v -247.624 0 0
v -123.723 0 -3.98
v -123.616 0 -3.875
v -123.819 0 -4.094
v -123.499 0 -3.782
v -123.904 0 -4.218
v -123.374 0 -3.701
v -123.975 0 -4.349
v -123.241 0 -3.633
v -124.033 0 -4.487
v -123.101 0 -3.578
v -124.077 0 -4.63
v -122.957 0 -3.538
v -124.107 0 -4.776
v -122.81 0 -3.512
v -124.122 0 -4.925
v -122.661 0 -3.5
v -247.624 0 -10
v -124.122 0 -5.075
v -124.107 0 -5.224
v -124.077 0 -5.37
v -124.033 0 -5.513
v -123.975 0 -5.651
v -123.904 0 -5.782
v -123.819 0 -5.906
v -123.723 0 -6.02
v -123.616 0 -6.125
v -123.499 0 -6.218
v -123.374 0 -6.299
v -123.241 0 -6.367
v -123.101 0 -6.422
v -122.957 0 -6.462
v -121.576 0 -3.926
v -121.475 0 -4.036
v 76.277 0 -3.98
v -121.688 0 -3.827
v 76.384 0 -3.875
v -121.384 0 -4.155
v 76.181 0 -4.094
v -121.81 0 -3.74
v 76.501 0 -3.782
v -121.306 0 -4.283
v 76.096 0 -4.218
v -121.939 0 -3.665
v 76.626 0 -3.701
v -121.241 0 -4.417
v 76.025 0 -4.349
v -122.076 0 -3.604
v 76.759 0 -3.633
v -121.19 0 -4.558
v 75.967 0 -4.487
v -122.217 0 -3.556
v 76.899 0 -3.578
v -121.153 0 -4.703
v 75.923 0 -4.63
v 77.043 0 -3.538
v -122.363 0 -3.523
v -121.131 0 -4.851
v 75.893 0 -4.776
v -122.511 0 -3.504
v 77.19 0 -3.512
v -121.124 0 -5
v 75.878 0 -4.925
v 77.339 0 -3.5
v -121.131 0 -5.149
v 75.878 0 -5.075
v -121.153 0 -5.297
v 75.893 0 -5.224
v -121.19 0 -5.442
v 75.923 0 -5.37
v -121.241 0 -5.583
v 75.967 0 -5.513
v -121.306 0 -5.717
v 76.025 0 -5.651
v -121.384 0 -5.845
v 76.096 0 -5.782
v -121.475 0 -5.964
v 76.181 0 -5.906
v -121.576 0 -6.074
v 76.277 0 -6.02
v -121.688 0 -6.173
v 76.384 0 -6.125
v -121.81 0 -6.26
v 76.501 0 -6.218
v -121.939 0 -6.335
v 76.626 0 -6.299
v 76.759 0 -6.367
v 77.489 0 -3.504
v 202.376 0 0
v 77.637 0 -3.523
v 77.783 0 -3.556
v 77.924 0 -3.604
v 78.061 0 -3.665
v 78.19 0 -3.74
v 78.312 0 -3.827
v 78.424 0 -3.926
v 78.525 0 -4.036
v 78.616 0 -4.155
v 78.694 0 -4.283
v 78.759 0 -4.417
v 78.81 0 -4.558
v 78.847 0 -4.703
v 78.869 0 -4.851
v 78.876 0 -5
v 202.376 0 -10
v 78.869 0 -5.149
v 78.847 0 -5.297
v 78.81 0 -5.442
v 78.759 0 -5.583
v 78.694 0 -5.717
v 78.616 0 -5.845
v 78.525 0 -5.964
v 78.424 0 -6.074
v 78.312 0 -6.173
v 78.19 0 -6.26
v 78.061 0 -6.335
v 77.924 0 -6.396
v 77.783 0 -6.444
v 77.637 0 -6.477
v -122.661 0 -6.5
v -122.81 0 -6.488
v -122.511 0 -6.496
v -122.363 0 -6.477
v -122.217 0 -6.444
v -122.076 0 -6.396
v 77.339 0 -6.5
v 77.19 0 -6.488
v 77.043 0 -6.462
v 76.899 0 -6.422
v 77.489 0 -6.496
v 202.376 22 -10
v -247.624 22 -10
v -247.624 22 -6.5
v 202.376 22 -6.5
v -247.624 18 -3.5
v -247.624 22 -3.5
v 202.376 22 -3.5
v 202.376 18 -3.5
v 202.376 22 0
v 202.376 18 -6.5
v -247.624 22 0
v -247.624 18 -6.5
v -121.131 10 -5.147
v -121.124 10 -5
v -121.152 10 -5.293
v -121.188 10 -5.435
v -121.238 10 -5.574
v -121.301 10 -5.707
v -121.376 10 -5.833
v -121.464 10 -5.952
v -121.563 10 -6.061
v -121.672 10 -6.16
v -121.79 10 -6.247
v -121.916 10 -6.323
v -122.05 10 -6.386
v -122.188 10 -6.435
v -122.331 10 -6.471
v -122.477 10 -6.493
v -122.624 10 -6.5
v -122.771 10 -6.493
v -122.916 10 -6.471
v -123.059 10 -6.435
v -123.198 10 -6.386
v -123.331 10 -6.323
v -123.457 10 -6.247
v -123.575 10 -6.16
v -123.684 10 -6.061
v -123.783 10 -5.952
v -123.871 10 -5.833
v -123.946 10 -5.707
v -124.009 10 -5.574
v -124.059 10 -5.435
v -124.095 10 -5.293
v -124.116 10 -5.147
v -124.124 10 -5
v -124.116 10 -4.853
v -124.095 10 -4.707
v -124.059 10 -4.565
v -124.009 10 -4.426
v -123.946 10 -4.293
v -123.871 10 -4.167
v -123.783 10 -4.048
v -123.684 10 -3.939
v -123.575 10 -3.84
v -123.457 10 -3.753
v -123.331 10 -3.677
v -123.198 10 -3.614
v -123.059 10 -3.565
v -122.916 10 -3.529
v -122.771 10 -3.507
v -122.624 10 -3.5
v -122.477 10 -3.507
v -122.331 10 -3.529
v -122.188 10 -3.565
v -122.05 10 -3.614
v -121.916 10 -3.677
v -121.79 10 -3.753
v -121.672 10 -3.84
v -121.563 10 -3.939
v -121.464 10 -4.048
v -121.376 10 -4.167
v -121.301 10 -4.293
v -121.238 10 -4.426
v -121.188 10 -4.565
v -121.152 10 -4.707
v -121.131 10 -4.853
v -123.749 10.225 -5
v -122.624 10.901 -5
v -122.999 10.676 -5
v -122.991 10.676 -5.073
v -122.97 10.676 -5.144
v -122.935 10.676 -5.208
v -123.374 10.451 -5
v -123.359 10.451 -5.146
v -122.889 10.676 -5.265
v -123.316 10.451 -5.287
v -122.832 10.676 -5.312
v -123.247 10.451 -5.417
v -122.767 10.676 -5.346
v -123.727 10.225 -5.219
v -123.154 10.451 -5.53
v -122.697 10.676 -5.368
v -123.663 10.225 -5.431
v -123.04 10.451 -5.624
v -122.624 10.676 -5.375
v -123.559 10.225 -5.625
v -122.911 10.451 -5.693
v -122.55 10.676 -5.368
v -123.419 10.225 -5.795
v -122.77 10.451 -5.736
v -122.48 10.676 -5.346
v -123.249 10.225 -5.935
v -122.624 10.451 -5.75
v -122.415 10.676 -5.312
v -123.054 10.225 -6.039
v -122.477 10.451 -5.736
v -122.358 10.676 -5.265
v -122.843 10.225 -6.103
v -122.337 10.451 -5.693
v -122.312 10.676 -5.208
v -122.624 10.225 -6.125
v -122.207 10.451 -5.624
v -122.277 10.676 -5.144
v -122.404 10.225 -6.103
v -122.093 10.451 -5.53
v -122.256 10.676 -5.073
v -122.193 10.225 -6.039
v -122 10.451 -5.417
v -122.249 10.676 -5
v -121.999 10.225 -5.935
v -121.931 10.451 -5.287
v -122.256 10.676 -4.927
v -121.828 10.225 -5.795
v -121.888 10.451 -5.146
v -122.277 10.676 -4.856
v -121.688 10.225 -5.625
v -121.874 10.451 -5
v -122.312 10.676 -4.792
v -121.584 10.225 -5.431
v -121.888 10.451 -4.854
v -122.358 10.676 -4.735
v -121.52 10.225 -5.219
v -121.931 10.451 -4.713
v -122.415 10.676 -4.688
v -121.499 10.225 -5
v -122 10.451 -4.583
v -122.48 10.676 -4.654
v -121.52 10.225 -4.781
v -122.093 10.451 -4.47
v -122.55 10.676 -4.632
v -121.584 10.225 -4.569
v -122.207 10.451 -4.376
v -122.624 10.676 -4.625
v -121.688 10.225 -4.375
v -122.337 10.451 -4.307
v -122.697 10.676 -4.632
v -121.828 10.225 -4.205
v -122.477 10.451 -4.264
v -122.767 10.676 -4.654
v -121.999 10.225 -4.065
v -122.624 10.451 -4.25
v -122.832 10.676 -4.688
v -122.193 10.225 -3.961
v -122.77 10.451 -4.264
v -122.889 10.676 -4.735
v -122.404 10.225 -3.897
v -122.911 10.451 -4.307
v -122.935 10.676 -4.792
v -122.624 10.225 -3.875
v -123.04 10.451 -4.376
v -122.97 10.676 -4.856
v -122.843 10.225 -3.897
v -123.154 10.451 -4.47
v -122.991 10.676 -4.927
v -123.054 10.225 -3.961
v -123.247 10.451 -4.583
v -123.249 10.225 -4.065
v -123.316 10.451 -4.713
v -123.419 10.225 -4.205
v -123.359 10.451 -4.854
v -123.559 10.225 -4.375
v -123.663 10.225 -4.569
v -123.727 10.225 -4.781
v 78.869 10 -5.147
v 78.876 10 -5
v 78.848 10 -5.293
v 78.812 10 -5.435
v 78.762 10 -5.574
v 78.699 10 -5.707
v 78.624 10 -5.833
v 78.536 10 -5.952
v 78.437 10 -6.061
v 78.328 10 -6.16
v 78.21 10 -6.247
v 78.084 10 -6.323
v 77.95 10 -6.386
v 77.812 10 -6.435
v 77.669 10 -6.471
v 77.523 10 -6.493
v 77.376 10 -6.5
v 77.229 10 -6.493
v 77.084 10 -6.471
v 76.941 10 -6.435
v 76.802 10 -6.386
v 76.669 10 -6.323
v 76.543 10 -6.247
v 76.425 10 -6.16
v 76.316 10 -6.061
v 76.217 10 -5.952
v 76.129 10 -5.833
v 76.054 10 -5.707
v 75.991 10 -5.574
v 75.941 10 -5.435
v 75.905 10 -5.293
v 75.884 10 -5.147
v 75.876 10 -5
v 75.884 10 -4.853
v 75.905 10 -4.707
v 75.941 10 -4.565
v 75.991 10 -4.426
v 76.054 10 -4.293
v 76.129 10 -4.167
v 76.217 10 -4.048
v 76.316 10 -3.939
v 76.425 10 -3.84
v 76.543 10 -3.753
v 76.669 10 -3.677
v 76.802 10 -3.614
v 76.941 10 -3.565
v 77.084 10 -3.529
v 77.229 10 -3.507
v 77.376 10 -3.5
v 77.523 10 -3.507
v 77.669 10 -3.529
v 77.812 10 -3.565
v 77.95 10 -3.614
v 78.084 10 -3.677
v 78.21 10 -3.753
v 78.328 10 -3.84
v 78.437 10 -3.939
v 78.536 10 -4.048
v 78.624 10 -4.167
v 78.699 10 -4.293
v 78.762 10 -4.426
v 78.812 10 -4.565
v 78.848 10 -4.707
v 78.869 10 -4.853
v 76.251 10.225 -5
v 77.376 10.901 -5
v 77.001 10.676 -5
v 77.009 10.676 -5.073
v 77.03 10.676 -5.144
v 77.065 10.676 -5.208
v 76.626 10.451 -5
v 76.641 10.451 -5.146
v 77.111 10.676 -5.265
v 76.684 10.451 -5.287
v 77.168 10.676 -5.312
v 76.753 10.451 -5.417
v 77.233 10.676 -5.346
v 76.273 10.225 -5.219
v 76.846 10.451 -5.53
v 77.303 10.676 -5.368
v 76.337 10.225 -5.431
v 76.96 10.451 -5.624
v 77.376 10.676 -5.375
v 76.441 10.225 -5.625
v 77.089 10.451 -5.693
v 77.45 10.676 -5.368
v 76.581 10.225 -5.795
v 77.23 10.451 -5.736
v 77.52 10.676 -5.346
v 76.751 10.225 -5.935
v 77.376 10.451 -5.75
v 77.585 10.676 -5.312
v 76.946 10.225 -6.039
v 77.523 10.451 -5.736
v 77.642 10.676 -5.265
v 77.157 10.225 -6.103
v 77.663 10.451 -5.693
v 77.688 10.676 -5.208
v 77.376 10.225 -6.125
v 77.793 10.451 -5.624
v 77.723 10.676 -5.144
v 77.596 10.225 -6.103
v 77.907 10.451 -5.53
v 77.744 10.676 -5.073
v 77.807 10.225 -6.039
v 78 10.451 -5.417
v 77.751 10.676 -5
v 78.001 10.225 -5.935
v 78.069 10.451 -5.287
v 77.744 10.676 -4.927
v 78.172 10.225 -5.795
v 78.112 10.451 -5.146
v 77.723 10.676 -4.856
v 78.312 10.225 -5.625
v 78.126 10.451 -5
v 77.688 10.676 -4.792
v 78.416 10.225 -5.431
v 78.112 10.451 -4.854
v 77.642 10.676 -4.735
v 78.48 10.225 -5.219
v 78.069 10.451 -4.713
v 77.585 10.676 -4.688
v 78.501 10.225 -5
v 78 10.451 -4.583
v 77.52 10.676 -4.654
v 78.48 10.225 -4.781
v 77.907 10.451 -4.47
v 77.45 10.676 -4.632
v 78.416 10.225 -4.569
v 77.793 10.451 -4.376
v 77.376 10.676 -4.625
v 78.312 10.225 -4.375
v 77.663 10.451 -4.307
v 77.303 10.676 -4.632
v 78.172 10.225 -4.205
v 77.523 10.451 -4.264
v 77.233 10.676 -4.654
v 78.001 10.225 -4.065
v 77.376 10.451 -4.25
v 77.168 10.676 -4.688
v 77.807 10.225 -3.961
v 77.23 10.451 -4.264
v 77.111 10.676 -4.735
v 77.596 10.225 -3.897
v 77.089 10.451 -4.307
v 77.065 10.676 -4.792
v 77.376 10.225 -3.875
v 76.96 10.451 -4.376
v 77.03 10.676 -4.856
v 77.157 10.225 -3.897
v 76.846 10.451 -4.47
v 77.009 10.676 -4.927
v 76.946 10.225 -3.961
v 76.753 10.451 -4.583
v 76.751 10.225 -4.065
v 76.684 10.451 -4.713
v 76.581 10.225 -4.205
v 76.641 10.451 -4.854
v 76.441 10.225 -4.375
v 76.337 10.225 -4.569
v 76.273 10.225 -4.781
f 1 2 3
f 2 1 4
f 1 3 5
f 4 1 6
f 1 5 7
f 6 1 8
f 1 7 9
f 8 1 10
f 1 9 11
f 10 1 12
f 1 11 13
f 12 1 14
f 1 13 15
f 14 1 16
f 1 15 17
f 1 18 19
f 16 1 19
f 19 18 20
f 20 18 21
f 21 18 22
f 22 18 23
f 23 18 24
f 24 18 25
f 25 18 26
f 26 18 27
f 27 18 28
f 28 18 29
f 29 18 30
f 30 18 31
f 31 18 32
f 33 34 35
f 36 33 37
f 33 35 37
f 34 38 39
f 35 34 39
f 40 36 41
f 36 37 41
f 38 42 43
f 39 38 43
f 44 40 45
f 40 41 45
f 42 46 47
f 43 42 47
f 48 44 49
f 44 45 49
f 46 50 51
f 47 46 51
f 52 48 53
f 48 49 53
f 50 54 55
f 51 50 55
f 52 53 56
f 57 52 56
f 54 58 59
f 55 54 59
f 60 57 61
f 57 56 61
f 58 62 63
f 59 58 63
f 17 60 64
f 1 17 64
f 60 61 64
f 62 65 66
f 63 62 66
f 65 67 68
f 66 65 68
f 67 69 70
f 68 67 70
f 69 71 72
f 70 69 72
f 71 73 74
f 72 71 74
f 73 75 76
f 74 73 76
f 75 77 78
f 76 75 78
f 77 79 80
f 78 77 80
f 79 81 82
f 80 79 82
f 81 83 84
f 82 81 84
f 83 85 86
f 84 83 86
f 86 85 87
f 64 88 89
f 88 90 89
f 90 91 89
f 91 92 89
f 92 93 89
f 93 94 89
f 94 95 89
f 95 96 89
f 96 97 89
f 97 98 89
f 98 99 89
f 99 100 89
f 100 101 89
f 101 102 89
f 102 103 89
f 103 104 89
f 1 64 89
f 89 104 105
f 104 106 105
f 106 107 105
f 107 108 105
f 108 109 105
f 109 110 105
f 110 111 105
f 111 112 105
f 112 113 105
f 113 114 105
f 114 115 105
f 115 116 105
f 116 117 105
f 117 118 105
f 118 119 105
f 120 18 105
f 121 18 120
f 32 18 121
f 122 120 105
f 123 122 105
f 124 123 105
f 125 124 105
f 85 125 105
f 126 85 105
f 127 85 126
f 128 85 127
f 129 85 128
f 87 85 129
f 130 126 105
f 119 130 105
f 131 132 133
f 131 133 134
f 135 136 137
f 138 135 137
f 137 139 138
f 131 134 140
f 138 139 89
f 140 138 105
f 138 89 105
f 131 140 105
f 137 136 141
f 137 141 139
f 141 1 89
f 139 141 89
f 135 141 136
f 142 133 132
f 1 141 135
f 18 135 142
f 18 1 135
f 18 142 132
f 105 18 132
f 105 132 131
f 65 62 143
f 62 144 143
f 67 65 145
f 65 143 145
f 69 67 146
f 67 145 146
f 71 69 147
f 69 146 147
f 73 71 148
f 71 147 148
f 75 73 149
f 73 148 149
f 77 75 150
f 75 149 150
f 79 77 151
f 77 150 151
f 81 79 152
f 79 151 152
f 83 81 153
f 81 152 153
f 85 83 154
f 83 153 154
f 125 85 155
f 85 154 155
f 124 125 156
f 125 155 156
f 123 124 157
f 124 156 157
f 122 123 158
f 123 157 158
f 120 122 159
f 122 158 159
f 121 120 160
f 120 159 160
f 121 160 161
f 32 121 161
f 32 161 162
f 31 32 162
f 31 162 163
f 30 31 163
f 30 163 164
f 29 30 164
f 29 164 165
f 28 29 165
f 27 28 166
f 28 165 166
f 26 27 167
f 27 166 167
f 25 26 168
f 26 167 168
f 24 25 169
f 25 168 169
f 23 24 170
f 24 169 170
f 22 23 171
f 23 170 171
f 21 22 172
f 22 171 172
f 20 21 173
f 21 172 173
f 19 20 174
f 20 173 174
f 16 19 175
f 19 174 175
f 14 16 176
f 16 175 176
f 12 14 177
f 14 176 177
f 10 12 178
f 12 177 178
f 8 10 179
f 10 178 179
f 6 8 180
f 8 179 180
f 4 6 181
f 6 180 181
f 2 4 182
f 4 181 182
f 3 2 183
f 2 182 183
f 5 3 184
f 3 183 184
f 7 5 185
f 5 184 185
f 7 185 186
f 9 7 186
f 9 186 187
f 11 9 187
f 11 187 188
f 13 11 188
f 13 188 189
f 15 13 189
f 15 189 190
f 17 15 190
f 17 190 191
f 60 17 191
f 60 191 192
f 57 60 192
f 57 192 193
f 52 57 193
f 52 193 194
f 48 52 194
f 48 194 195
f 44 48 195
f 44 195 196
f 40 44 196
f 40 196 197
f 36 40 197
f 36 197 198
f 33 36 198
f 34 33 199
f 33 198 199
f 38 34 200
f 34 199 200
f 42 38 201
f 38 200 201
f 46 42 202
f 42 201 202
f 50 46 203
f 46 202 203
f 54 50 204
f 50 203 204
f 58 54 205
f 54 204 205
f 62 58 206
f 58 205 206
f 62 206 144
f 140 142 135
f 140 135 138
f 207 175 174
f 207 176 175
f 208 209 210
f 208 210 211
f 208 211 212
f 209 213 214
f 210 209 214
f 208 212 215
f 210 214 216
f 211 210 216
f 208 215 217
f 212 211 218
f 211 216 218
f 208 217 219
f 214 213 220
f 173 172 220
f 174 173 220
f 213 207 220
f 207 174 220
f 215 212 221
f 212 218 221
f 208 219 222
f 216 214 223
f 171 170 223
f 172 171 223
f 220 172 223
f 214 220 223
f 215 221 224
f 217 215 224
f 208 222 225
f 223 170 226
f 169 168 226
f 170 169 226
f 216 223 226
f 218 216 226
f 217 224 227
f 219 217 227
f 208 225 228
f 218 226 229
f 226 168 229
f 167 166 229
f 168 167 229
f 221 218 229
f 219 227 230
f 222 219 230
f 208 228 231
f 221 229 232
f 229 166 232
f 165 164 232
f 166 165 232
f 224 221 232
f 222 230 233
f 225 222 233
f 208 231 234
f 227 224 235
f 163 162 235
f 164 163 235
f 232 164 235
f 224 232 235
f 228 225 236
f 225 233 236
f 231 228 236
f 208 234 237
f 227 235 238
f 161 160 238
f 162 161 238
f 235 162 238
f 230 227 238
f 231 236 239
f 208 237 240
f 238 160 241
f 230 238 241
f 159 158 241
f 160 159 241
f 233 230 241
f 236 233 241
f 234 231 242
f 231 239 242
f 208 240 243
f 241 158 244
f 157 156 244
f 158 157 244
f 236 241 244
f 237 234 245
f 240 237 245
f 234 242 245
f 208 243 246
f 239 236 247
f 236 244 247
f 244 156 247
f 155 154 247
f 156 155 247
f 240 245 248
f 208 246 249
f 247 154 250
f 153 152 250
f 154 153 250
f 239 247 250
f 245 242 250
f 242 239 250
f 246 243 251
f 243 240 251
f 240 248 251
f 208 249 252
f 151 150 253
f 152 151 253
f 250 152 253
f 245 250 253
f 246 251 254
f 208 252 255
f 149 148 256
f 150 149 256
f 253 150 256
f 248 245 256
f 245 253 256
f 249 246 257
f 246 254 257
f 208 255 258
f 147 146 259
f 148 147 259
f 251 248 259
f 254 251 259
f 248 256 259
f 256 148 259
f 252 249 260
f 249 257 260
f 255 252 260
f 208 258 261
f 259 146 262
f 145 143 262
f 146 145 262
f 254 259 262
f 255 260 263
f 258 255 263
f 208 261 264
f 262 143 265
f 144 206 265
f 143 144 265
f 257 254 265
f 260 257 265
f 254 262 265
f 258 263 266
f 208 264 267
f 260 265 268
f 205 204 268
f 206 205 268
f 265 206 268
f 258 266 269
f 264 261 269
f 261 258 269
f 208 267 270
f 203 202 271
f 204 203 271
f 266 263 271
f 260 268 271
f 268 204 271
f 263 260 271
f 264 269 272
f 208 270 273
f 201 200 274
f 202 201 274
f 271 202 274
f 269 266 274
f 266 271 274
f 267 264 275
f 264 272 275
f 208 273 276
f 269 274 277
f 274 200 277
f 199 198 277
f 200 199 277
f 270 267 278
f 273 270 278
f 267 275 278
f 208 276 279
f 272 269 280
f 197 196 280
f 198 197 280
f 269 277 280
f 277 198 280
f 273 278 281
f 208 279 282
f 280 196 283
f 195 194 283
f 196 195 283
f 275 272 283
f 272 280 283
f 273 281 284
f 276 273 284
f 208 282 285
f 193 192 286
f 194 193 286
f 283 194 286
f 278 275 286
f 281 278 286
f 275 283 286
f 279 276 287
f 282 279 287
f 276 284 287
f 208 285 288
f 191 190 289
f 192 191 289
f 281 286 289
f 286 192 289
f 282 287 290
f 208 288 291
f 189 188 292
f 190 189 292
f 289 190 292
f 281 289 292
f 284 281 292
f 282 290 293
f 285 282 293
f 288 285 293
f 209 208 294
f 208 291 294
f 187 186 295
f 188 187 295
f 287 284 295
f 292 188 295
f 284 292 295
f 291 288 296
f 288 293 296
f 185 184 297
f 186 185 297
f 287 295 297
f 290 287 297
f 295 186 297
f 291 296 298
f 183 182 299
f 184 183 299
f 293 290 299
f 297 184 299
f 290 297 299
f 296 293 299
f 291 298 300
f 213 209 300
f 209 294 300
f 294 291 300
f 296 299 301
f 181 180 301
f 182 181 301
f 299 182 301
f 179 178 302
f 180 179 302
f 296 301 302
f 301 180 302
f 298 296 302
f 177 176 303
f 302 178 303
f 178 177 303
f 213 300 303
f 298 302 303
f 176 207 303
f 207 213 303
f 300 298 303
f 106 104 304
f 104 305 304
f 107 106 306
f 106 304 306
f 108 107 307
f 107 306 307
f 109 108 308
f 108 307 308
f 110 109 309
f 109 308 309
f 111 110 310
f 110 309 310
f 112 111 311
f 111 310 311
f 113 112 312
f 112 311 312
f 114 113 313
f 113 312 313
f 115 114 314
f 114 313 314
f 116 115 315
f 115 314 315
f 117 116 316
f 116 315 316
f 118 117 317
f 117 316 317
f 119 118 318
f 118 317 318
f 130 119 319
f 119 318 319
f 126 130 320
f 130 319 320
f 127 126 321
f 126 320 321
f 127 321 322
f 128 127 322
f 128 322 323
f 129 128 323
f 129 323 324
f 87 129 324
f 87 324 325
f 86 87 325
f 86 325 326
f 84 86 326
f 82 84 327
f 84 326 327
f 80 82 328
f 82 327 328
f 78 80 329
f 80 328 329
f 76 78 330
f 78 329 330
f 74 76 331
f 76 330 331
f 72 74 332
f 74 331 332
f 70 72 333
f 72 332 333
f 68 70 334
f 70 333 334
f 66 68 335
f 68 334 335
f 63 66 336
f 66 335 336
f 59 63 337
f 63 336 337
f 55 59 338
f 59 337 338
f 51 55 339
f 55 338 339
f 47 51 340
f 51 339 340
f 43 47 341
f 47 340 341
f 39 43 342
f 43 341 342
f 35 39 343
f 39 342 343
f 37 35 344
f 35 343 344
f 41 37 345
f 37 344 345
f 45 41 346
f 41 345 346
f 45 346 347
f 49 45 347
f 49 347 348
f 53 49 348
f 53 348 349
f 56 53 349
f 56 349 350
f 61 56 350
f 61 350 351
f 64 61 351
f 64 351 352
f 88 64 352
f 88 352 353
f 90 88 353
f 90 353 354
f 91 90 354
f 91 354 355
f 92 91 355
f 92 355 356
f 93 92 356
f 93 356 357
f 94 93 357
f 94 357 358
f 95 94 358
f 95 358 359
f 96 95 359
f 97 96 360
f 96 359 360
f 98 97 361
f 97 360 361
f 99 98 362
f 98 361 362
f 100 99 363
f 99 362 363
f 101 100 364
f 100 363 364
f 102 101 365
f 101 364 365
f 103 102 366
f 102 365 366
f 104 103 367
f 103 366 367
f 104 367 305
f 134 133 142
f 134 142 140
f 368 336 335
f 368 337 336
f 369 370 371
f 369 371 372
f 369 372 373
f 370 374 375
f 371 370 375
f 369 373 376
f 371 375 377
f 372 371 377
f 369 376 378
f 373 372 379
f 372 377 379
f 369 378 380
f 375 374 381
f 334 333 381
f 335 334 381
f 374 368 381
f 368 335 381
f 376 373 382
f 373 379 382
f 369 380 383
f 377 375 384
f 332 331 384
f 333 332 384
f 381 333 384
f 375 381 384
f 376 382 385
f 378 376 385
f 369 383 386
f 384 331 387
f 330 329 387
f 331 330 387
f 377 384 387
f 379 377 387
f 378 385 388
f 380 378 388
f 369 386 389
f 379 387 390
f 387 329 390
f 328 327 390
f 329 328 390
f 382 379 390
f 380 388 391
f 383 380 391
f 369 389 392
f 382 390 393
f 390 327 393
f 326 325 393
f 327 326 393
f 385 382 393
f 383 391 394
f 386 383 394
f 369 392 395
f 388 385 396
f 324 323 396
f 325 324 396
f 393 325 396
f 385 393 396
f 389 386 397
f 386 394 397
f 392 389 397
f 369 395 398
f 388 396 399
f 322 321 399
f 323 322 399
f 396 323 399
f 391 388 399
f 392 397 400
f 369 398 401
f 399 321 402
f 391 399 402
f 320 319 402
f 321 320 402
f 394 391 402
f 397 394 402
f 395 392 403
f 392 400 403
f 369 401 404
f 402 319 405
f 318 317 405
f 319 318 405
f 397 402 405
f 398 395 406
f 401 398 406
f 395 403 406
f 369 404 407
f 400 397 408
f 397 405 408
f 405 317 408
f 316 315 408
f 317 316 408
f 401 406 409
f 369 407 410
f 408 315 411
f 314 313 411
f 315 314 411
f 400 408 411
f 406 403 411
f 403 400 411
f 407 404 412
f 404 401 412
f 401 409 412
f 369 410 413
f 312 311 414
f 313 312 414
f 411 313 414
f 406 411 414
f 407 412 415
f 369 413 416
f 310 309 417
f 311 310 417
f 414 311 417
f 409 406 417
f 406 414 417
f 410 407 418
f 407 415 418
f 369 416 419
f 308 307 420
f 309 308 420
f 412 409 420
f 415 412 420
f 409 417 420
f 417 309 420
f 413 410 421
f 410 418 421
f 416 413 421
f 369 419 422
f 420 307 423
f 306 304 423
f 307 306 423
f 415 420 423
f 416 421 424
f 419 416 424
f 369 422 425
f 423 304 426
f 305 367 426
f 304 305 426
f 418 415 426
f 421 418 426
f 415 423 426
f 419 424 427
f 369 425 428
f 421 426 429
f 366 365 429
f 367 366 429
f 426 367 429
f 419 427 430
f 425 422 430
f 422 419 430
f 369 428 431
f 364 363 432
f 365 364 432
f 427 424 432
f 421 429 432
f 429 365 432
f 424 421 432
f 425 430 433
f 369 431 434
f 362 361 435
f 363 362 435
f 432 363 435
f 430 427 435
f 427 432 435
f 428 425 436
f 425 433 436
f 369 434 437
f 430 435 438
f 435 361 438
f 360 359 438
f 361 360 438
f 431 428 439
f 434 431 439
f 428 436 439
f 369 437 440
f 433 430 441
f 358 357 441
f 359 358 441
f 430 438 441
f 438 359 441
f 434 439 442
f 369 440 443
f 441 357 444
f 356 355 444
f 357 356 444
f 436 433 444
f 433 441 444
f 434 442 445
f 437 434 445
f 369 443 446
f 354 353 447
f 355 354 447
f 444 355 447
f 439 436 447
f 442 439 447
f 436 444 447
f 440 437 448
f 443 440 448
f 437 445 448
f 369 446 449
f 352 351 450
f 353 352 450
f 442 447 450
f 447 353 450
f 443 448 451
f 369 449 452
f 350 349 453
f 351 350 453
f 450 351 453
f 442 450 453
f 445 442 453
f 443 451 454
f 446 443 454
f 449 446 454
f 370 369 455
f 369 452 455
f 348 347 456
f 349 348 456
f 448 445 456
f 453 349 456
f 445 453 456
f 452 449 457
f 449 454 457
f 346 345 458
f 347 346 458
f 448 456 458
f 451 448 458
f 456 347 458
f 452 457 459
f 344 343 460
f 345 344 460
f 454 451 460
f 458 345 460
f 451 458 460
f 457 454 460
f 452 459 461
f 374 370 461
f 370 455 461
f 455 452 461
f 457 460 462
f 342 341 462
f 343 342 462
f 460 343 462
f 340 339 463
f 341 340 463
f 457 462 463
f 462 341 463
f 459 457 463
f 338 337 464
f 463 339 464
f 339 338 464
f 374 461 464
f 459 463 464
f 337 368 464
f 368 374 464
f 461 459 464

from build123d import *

# Parameters (mm, degrees)
SZKIC1_W                       = 450
SZKIC1_H                       = 10
DODANIE_WYCI_GNI_CIE1_DEPTH    = 22
SZKIC2_W                       = 450
SZKIC2_H                       = 3
WYTNIJ_WYCI_GNI_CIE1_DEPTH     = 4
OTWORY_USTALAJ_CE_3_0MM1_D     = 3
OTWORY_USTALAJ_CE_3_0MM1_DEPTH = 10
OTWORY_USTALAJ_CE_3_0MM1_TIP   = 0.901290929


with BuildPart() as part:
    # Szkic1 → Dodanie-wyciągnięcie1 (new body)
    with BuildSketch(Plane(origin=(0, 0, 0), x_dir=(1, 0, 0), z_dir=(0, 1, 0))):
        with Locations((-22.623576347, 5)):
            Rectangle(SZKIC1_W, SZKIC1_H)
    extrude(amount=DODANIE_WYCI_GNI_CIE1_DEPTH)

    # Szkic2 → Wytnij-wyciągnięcie1 (cut)
    with BuildSketch(Plane(origin=(0, 22, 0), x_dir=(1, 0, 0), z_dir=(0, 1, 0))):
        with Locations((-22.623576347, 5)):
            Rectangle(SZKIC2_W, SZKIC2_H)
    extrude(amount=-WYTNIJ_WYCI_GNI_CIE1_DEPTH, mode=Mode.SUBTRACT)

    # Otwory ustalające Ø3.0mm1
    with Locations(Plane(origin=(0, 0, 0), x_dir=(-1, 0, 0), z_dir=(0, -1, 0))):
        with Locations((-77.376423653, 5), (122.623576347, 5)):
            Hole(OTWORY_USTALAJ_CE_3_0MM1_D / 2, depth=OTWORY_USTALAJ_CE_3_0MM1_DEPTH)
            with Locations((0, 0, -(OTWORY_USTALAJ_CE_3_0MM1_DEPTH + OTWORY_USTALAJ_CE_3_0MM1_TIP / 2))):  # 118° drill point
                Cone(0, OTWORY_USTALAJ_CE_3_0MM1_D / 2, OTWORY_USTALAJ_CE_3_0MM1_TIP, mode=Mode.SUBTRACT)


solid = part.part
